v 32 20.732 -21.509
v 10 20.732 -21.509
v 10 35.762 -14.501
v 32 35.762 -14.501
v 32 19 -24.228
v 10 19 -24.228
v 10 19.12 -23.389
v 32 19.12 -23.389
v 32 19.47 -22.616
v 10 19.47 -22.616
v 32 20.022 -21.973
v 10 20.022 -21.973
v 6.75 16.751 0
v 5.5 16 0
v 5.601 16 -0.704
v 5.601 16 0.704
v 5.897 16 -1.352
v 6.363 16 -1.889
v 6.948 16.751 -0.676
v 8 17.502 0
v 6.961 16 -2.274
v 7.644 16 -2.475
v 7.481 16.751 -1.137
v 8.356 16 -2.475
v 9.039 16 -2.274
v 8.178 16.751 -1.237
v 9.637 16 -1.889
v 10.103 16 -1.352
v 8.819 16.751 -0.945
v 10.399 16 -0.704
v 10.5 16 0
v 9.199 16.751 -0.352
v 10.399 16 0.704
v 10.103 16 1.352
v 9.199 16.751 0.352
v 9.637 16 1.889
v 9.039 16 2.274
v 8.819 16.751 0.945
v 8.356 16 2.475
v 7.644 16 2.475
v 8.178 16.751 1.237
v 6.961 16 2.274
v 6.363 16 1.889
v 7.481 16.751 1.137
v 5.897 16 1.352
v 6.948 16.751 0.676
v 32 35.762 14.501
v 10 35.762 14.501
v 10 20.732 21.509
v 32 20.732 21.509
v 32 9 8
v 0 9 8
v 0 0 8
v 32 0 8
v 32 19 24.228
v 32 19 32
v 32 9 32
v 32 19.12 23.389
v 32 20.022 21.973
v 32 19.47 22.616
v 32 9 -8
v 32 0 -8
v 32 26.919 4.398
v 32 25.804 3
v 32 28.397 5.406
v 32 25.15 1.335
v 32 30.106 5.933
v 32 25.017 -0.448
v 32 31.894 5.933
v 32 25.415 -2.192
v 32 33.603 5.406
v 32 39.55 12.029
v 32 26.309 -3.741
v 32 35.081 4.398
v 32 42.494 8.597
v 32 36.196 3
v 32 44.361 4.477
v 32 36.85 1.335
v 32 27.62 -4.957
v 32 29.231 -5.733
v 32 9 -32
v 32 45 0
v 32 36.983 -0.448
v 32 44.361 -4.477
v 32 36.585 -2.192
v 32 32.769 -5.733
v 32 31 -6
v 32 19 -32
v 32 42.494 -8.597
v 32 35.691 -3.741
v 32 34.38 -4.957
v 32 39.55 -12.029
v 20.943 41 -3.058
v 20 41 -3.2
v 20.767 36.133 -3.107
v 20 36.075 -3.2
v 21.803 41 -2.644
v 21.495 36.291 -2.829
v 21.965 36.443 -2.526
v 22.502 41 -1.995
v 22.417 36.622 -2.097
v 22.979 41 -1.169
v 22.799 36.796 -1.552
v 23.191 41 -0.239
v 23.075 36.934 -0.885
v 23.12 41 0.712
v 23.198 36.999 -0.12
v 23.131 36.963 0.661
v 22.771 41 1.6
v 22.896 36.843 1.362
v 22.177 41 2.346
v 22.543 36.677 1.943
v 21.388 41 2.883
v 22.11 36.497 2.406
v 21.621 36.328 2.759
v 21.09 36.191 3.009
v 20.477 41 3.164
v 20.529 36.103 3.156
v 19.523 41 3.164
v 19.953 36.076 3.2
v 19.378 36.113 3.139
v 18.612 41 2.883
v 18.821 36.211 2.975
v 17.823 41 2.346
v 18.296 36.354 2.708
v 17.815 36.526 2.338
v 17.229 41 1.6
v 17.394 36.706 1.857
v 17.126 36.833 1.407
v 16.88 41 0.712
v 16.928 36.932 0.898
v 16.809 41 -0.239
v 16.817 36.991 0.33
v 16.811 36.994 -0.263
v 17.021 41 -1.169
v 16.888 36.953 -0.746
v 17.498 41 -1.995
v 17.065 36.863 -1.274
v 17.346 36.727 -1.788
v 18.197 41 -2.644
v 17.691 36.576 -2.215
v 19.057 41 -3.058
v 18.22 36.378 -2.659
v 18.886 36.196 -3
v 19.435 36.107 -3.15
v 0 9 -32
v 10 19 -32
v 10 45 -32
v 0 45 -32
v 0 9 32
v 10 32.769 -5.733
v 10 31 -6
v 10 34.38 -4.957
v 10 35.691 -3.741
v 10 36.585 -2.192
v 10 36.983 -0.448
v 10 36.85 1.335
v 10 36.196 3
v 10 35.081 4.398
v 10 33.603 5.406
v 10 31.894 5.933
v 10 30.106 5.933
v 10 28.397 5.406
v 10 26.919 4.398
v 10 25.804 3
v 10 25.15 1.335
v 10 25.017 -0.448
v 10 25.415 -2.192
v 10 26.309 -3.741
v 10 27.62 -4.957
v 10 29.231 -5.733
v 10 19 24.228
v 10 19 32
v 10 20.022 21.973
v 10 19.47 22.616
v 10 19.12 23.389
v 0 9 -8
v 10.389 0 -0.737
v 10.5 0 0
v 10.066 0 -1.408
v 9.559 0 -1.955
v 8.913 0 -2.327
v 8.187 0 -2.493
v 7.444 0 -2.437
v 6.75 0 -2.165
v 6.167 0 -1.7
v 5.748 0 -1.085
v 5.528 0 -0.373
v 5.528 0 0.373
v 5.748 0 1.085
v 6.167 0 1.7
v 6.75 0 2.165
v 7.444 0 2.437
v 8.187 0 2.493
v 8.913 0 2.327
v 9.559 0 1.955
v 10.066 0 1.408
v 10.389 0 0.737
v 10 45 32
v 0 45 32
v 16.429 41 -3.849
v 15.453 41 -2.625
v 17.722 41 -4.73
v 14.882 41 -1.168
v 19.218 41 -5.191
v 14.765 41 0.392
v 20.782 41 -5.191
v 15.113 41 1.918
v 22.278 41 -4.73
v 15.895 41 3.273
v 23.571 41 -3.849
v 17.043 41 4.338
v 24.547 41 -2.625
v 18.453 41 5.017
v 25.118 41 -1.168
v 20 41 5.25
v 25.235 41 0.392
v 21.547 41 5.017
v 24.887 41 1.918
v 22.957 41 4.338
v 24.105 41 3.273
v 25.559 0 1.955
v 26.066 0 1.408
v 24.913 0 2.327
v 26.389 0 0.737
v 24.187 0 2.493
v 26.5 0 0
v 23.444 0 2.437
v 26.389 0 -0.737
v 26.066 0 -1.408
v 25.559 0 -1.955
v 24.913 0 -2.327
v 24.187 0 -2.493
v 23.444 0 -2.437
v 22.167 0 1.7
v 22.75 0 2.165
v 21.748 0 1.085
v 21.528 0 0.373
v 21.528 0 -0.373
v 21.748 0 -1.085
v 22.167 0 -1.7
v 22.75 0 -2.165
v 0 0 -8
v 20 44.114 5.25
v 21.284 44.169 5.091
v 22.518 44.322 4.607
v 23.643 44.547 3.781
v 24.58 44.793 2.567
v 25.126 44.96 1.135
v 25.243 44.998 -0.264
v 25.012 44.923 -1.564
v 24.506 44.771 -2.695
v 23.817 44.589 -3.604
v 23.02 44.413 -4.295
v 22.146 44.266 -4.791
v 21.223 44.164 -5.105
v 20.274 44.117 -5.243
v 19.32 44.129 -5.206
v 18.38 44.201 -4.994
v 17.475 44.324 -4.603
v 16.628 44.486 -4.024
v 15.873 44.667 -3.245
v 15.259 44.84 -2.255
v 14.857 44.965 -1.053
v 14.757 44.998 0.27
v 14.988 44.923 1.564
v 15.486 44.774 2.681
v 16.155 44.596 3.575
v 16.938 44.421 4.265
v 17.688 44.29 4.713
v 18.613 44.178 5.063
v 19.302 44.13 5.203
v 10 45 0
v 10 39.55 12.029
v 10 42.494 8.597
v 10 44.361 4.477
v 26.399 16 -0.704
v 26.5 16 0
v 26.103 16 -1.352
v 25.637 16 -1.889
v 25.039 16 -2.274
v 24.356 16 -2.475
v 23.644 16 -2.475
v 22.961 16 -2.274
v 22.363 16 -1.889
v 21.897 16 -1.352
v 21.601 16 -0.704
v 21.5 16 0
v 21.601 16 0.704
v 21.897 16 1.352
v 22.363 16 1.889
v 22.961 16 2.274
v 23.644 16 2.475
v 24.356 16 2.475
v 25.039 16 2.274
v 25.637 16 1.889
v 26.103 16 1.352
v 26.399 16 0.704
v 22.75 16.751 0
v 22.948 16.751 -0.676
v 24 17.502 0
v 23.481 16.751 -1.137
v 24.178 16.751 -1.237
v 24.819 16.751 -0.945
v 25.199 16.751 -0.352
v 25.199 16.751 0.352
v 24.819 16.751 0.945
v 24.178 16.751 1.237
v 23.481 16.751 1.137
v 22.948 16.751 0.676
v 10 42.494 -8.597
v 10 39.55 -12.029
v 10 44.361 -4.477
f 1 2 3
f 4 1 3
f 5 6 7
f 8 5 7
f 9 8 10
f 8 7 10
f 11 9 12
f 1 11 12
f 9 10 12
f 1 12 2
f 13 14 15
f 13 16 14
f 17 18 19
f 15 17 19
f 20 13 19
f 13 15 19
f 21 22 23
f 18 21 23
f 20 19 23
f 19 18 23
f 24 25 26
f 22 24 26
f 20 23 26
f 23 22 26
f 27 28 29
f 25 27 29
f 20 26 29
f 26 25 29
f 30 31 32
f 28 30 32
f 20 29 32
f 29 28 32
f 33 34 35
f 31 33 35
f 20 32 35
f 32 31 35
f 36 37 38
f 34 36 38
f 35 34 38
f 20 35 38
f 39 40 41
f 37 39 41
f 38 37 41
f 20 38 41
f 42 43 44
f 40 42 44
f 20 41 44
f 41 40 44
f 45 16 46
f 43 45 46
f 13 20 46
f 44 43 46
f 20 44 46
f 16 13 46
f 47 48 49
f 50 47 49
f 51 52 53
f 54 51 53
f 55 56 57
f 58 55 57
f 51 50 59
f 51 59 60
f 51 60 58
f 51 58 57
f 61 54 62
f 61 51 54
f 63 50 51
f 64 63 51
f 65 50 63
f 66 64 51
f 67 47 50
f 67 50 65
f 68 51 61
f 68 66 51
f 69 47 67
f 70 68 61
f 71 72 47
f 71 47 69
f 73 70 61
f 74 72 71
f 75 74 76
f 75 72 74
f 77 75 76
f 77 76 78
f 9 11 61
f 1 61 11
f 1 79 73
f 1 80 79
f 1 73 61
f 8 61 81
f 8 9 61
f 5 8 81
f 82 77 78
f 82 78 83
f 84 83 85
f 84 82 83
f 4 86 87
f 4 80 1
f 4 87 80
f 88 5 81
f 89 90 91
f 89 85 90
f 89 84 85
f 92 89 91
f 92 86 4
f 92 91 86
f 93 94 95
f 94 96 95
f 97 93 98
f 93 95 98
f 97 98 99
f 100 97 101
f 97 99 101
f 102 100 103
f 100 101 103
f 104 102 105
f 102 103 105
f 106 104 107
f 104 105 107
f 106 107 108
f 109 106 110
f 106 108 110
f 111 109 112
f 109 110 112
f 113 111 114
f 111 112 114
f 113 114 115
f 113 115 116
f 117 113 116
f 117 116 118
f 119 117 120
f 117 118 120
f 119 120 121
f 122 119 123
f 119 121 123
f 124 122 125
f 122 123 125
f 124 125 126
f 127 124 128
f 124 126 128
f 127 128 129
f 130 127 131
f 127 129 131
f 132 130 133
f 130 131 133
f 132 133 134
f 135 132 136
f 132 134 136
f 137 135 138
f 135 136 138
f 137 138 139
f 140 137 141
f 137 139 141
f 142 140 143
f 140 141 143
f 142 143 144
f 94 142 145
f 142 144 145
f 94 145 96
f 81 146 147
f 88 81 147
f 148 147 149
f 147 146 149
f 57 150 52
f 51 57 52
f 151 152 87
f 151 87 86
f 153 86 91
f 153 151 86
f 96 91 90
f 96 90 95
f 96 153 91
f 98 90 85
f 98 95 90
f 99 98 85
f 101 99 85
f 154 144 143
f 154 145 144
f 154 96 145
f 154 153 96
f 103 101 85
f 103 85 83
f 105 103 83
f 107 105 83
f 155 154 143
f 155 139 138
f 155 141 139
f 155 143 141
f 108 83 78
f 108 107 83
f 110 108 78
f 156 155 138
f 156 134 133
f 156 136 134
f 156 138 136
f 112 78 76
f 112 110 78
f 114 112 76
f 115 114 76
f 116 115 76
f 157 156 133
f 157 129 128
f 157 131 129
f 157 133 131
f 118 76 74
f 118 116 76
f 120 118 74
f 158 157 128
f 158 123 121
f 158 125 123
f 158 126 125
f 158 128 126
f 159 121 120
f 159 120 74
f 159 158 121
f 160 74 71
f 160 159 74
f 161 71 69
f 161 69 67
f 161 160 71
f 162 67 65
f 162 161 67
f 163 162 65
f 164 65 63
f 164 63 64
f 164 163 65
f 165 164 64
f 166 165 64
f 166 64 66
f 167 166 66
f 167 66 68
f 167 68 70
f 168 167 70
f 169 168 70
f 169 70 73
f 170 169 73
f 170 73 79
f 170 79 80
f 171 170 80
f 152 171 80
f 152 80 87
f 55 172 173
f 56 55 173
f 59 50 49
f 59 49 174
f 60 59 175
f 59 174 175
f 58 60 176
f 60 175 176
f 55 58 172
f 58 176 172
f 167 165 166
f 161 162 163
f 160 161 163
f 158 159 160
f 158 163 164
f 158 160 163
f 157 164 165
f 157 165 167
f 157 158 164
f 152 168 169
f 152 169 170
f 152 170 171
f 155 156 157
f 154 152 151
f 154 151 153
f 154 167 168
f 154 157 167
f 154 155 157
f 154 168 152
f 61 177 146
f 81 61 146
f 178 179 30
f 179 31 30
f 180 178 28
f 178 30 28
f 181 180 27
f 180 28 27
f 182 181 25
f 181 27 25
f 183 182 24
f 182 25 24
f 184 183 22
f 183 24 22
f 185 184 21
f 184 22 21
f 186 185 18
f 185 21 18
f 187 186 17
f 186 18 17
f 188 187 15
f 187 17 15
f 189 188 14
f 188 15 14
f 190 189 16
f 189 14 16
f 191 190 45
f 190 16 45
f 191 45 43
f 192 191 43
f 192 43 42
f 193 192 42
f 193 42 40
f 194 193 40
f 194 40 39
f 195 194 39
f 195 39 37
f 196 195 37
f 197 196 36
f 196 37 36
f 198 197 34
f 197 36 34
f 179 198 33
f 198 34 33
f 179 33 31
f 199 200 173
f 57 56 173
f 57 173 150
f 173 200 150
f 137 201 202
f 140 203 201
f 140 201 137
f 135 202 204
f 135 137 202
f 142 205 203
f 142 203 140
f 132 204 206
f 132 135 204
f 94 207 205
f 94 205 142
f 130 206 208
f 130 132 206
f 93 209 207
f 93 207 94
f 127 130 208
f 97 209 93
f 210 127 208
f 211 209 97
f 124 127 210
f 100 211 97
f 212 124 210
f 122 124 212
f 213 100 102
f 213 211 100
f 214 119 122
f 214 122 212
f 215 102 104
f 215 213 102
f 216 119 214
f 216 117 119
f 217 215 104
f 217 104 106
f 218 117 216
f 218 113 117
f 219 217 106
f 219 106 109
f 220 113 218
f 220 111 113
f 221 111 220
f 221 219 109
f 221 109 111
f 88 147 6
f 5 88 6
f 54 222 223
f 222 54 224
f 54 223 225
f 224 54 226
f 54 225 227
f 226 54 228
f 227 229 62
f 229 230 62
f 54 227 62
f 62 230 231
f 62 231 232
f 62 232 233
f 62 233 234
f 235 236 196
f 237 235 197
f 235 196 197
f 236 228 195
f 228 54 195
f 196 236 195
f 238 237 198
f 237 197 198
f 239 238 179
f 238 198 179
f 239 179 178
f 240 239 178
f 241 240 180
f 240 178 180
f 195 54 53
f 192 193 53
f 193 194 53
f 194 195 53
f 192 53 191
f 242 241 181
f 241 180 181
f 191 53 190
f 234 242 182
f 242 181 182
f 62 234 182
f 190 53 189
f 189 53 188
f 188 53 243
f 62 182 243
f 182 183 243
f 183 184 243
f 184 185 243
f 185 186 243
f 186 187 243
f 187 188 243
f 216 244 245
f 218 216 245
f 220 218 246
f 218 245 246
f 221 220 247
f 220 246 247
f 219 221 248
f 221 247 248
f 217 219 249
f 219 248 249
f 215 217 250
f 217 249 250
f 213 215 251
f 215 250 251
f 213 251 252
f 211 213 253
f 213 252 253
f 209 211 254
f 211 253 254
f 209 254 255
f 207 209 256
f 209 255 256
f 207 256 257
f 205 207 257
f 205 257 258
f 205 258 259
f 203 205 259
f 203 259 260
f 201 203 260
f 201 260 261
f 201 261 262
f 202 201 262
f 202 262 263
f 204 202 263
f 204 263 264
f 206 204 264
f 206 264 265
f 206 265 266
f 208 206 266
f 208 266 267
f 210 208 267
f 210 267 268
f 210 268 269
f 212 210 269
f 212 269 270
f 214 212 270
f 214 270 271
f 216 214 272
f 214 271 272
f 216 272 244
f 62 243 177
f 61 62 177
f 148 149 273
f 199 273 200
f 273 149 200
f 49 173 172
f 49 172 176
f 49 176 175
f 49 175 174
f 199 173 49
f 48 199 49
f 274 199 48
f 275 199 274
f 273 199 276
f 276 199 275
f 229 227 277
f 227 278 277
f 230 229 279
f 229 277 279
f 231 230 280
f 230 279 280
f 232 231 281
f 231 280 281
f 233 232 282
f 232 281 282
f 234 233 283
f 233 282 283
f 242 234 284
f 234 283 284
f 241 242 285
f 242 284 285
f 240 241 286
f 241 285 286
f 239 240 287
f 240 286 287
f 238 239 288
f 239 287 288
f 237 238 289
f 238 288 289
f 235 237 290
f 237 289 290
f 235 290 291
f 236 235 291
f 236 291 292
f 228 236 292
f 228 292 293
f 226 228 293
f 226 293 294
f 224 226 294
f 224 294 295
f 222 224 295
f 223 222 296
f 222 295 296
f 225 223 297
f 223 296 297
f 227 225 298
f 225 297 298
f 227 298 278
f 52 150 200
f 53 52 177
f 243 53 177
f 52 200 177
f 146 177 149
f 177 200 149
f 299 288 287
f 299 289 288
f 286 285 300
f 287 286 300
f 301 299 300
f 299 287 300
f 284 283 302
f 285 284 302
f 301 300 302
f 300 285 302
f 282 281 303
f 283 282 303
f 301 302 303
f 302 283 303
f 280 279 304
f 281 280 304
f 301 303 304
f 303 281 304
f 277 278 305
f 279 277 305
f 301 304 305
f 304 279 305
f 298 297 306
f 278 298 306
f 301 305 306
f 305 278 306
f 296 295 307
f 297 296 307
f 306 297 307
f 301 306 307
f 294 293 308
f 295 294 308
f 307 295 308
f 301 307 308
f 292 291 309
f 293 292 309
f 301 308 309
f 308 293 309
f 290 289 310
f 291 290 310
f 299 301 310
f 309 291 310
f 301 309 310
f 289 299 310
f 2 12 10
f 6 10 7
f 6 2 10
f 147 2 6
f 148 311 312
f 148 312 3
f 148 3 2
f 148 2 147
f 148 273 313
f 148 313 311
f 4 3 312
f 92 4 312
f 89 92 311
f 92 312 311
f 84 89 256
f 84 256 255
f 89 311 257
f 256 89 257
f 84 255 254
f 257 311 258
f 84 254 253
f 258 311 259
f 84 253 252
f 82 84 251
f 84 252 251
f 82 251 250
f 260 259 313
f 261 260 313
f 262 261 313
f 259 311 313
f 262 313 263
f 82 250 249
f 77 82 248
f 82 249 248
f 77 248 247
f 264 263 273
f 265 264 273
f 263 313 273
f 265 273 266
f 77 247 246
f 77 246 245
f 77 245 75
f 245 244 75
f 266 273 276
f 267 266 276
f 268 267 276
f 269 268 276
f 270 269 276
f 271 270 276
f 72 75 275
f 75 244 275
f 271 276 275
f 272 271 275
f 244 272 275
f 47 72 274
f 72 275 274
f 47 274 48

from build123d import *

# Parameters (mm, degrees)
SKETCH2_R                       = 6
BOSS_EXTRUDE1_DEPTH             = 32
BOSS_EXTRUDE2_DEPTH             = 10
CBORE_FOR_M6_SHCS1_D            = 6.4
CBORE_FOR_M6_SHCS1_DEPTH        = 10
CBORE_FOR_M6_SHCS1_CBORE_D      = 10.5
CBORE_FOR_M6_SHCS1_CBORE_DEPTH  = 4
CBORE_FOR_M6_SHCS1_TIP          = 1.922753981
TAP_DRILL_FOR_M6X1_0_TAP1_D     = 5
TAP_DRILL_FOR_M6X1_0_TAP1_DEPTH = 16
TAP_DRILL_FOR_M6X1_0_TAP1_TIP   = 1.502151548
SKETCH2_6_R                     = 6
BOSS_EXTRUDE3_DEPTH             = 10


with BuildPart() as part:
    # Sketch2 → Boss-Extrude1 (new body)
    with BuildSketch(Plane(origin=(0, 0, 0), x_dir=(0, 0, -1), z_dir=(1, 0, 0))):
        with BuildLine():
            Line((-8, 9), (-8, 0))
            Line((-8, 0), (8, 0))
            Line((8, 0), (8, 9))
            Line((8, 9), (32, 9))
            Line((32, 9), (32, 19))
            Line((32, 19), (24.228334067, 19))
            ThreePointArc((24.228334067, 19), (22.616435242, 19.469825663), (21.509410706, 20.732145215))
            Line((21.509410706, 20.732145215), (14.500924593, 35.761892188))
            ThreePointArc((14.500924593, 35.761892188), (8.596793734, 42.494263133), (0, 45))
            ThreePointArc((0, 45), (-8.596793734, 42.494263133), (-14.500924593, 35.761892188))
            Line((-14.500924593, 35.761892188), (-21.509410706, 20.732145215))
            ThreePointArc((-21.509410706, 20.732145215), (-22.616435242, 19.469825663), (-24.228334067, 19))
            Line((-24.228334067, 19), (-32, 19))
            Line((-32, 19), (-32, 9))
            Line((-32, 9), (-8, 9))
        make_face()
        with Locations((0, 31)):
            Circle(SKETCH2_R, mode=Mode.SUBTRACT)
    extrude(amount=BOSS_EXTRUDE1_DEPTH)

    # Sketch2<5> → Boss-Extrude2 (add)
    with BuildSketch(Plane(origin=(0, 0, 0), x_dir=(0, 0, -1), z_dir=(1, 0, 0))):
        with BuildLine():
            Line((-32, 45), (-32, 19))
            Line((-32, 19), (-24.228334067, 19))
            ThreePointArc((-24.228334067, 19), (-22.616435242, 19.469825663), (-21.509410706, 20.732145215))
            Line((-21.509410706, 20.732145215), (-14.500924593, 35.761892188))
            ThreePointArc((-14.500924593, 35.761892188), (-8.596793734, 42.494263133), (0, 45))
            Line((0, 45), (-32, 45))
        make_face()
        with BuildLine():
            Line((24.228334067, 19), (32, 19))
            Line((32, 19), (32, 45))
            Line((32, 45), (0, 45))
            ThreePointArc((0, 45), (8.596793734, 42.494263133), (14.500924593, 35.761892188))
            Line((14.500924593, 35.761892188), (21.509410706, 20.732145215))
            ThreePointArc((21.509410706, 20.732145215), (22.616435242, 19.469825663), (24.228334067, 19))
        make_face()
    extrude(amount=BOSS_EXTRUDE2_DEPTH)

    # CBORE for M6 SHCS1
    with Locations(Plane(origin=(20, 45, 0), x_dir=(0, 0, 1), z_dir=(0, 1, 0))):
        with Locations((0, 0)):
            CounterBoreHole(CBORE_FOR_M6_SHCS1_D / 2, CBORE_FOR_M6_SHCS1_CBORE_D / 2, CBORE_FOR_M6_SHCS1_CBORE_DEPTH, depth=CBORE_FOR_M6_SHCS1_DEPTH)
            with Locations((0, 0, -(CBORE_FOR_M6_SHCS1_DEPTH + CBORE_FOR_M6_SHCS1_TIP / 2))):  # 118° drill point
                Cone(0, CBORE_FOR_M6_SHCS1_D / 2, CBORE_FOR_M6_SHCS1_TIP, mode=Mode.SUBTRACT)

    # Tap Drill for M6x1.0 Tap1
    with Locations(Plane(origin=(0, 0, 0), x_dir=(-1, 0, 0), z_dir=(0, -1, 0))):
        with Locations((-24, 0), (-8, 0)):
            Hole(TAP_DRILL_FOR_M6X1_0_TAP1_D / 2, depth=TAP_DRILL_FOR_M6X1_0_TAP1_DEPTH)
            with Locations((0, 0, -(TAP_DRILL_FOR_M6X1_0_TAP1_DEPTH + TAP_DRILL_FOR_M6X1_0_TAP1_TIP / 2))):  # 118° drill point
                Cone(0, TAP_DRILL_FOR_M6X1_0_TAP1_D / 2, TAP_DRILL_FOR_M6X1_0_TAP1_TIP, mode=Mode.SUBTRACT)

    # Sketch2<6> → Boss-Extrude3 (add)
    with BuildSketch(Plane(origin=(0, 0, 0), x_dir=(0, 0, -1), z_dir=(1, 0, 0))):
        with Locations((0, 31)):
            Circle(SKETCH2_6_R)
    extrude(amount=BOSS_EXTRUDE3_DEPTH)


solid = part.part
